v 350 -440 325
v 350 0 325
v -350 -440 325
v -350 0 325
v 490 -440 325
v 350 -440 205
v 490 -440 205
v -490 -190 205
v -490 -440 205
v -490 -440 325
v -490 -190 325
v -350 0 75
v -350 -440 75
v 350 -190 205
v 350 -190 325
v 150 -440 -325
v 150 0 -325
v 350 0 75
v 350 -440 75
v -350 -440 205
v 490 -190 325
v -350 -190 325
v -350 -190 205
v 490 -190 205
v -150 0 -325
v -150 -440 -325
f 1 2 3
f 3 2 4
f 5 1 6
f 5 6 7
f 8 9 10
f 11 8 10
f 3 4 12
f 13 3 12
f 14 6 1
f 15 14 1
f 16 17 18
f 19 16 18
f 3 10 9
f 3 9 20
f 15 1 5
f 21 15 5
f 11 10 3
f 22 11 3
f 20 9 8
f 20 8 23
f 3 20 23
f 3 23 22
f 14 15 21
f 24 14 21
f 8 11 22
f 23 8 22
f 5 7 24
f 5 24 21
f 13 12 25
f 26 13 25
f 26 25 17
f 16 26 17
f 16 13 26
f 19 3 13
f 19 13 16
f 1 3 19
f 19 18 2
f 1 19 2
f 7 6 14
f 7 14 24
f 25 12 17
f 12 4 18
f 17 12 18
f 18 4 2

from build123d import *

# Parameters (mm, degrees)
F1_DEPTH = 440
F2_W     = 140
F2_H     = 120
F3_DEPTH = 250
F4_W     = 140
F4_H     = 120
F5_DEPTH = 250


with BuildPart() as f1:
    # F0 (on Front) → F1 (new body)
    with BuildSketch(Plane.XZ):
        Polygon((350, 75), (350, 325), (-350, 325), (-350, 75), (-150, -325), (150, -325), align=None)
    extrude(amount=F1_DEPTH)


with BuildPart() as f3:
    # F2 (on face) → F3 (new body)
    with BuildSketch(Plane.XZ.offset(440)):
        with Locations((-420, 265)):
            Rectangle(F2_W, F2_H)
    extrude(amount=-F3_DEPTH)


with BuildPart() as f5:
    # F4 (on face) → F5 (new body)
    with BuildSketch(Plane.XZ.offset(440)):
        with Locations((420, 265)):
            Rectangle(F4_W, F4_H)
    extrude(amount=-F5_DEPTH)


solid = Compound([f1.part, f3.part, f5.part])
